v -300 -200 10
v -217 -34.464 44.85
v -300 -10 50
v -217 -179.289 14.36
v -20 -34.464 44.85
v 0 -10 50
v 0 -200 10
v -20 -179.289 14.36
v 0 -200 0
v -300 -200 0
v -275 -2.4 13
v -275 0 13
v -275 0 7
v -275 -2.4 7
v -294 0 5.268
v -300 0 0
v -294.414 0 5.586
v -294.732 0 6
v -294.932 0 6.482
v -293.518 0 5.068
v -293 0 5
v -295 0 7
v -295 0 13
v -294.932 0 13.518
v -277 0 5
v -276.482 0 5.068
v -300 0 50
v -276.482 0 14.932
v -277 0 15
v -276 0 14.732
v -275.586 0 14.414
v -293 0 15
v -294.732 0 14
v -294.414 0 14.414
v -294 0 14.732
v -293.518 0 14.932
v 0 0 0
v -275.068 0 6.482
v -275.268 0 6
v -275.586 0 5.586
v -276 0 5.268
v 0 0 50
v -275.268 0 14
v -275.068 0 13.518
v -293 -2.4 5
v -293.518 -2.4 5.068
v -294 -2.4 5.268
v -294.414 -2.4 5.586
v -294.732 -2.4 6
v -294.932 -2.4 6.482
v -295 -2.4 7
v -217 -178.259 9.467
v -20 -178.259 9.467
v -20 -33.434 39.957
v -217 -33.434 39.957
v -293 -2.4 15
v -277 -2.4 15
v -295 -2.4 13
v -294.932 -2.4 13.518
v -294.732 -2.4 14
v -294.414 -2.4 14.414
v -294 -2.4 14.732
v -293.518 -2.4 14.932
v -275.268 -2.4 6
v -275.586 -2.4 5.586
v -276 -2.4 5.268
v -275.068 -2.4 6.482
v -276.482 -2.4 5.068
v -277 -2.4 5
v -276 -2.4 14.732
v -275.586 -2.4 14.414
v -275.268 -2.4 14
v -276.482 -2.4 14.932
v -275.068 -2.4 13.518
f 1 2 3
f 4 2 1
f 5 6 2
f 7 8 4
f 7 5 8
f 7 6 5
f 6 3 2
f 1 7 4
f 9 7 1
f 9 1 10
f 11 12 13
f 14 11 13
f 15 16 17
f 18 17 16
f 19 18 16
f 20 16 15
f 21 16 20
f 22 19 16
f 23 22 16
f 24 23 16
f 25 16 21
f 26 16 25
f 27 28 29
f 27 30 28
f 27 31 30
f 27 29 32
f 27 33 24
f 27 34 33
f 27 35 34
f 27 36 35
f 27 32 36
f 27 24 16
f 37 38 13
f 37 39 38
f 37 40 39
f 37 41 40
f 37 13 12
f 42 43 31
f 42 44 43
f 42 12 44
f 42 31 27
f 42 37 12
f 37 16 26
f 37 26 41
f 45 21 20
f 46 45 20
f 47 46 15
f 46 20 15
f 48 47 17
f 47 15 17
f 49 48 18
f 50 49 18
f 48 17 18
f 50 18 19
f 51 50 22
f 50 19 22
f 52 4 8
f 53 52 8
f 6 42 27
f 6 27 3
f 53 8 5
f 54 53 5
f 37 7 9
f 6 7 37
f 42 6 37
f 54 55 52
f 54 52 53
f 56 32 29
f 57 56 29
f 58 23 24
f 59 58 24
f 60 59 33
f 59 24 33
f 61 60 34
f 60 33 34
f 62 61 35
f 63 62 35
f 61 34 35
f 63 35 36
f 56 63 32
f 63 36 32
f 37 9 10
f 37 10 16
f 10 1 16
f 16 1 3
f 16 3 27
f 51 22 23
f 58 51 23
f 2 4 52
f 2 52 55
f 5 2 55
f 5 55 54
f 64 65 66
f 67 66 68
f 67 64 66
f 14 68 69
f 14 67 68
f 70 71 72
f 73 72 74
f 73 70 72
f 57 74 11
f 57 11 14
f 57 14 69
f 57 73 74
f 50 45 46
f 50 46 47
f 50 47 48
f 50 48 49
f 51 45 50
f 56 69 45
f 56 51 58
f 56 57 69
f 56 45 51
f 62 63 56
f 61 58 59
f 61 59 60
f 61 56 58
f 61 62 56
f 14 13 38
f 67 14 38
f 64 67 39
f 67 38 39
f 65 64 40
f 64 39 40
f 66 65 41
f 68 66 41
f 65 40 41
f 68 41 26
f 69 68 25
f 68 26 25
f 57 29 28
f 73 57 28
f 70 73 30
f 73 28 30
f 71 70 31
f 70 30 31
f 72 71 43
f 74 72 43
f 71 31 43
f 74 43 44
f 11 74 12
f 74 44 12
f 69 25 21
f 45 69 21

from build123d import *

# Parameters (mm, degrees)
F1_DEPTH = 300
F3_W     = 197
F3_H     = 148
F4_DEPTH = 5
F6_DEPTH = 2.4


with BuildPart() as f1:
    # F0 (on Right) → F1 (new body)
    with BuildSketch(Plane.YZ):
        Polygon((-200, 10), (-200, 0), (0, 0), (0, 50), (-10, 50), align=None)
    extrude(amount=-F1_DEPTH)

    # F3 (on offset) → F4 (cut)
    with BuildSketch(Plane(origin=(0, -10.5039787798, 49.8938992042), x_dir=(1, 0, 0), z_dir=(0, -0.206010481, 0.978549785))):
        with Locations((-118.5, -98.4849737974)):
            Rectangle(F3_W, F3_H)
    extrude(amount=-F4_DEPTH, mode=Mode.SUBTRACT)

    # F5 (on face) → F6 (cut)
    with BuildSketch(Plane(origin=(0, 0, 0), x_dir=(-1, 0, 0), z_dir=(0, 1, 0))):
        with BuildLine():
            Line((277, 5), (293, 5))
            ThreePointArc((293, 5), (294.4142135624, 5.5857864376), (295, 7))
            Line((295, 7), (295, 13))
            ThreePointArc((295, 13), (294.4142135624, 14.4142135624), (293, 15))
            Line((293, 15), (277, 15))
            ThreePointArc((277, 15), (275.5857864376, 14.4142135624), (275, 13))
            Line((275, 13), (275, 7))
            ThreePointArc((275, 7), (275.5857864376, 5.5857864376), (277, 5))
        make_face()
    extrude(amount=-F6_DEPTH, mode=Mode.SUBTRACT)


solid = f1.part
